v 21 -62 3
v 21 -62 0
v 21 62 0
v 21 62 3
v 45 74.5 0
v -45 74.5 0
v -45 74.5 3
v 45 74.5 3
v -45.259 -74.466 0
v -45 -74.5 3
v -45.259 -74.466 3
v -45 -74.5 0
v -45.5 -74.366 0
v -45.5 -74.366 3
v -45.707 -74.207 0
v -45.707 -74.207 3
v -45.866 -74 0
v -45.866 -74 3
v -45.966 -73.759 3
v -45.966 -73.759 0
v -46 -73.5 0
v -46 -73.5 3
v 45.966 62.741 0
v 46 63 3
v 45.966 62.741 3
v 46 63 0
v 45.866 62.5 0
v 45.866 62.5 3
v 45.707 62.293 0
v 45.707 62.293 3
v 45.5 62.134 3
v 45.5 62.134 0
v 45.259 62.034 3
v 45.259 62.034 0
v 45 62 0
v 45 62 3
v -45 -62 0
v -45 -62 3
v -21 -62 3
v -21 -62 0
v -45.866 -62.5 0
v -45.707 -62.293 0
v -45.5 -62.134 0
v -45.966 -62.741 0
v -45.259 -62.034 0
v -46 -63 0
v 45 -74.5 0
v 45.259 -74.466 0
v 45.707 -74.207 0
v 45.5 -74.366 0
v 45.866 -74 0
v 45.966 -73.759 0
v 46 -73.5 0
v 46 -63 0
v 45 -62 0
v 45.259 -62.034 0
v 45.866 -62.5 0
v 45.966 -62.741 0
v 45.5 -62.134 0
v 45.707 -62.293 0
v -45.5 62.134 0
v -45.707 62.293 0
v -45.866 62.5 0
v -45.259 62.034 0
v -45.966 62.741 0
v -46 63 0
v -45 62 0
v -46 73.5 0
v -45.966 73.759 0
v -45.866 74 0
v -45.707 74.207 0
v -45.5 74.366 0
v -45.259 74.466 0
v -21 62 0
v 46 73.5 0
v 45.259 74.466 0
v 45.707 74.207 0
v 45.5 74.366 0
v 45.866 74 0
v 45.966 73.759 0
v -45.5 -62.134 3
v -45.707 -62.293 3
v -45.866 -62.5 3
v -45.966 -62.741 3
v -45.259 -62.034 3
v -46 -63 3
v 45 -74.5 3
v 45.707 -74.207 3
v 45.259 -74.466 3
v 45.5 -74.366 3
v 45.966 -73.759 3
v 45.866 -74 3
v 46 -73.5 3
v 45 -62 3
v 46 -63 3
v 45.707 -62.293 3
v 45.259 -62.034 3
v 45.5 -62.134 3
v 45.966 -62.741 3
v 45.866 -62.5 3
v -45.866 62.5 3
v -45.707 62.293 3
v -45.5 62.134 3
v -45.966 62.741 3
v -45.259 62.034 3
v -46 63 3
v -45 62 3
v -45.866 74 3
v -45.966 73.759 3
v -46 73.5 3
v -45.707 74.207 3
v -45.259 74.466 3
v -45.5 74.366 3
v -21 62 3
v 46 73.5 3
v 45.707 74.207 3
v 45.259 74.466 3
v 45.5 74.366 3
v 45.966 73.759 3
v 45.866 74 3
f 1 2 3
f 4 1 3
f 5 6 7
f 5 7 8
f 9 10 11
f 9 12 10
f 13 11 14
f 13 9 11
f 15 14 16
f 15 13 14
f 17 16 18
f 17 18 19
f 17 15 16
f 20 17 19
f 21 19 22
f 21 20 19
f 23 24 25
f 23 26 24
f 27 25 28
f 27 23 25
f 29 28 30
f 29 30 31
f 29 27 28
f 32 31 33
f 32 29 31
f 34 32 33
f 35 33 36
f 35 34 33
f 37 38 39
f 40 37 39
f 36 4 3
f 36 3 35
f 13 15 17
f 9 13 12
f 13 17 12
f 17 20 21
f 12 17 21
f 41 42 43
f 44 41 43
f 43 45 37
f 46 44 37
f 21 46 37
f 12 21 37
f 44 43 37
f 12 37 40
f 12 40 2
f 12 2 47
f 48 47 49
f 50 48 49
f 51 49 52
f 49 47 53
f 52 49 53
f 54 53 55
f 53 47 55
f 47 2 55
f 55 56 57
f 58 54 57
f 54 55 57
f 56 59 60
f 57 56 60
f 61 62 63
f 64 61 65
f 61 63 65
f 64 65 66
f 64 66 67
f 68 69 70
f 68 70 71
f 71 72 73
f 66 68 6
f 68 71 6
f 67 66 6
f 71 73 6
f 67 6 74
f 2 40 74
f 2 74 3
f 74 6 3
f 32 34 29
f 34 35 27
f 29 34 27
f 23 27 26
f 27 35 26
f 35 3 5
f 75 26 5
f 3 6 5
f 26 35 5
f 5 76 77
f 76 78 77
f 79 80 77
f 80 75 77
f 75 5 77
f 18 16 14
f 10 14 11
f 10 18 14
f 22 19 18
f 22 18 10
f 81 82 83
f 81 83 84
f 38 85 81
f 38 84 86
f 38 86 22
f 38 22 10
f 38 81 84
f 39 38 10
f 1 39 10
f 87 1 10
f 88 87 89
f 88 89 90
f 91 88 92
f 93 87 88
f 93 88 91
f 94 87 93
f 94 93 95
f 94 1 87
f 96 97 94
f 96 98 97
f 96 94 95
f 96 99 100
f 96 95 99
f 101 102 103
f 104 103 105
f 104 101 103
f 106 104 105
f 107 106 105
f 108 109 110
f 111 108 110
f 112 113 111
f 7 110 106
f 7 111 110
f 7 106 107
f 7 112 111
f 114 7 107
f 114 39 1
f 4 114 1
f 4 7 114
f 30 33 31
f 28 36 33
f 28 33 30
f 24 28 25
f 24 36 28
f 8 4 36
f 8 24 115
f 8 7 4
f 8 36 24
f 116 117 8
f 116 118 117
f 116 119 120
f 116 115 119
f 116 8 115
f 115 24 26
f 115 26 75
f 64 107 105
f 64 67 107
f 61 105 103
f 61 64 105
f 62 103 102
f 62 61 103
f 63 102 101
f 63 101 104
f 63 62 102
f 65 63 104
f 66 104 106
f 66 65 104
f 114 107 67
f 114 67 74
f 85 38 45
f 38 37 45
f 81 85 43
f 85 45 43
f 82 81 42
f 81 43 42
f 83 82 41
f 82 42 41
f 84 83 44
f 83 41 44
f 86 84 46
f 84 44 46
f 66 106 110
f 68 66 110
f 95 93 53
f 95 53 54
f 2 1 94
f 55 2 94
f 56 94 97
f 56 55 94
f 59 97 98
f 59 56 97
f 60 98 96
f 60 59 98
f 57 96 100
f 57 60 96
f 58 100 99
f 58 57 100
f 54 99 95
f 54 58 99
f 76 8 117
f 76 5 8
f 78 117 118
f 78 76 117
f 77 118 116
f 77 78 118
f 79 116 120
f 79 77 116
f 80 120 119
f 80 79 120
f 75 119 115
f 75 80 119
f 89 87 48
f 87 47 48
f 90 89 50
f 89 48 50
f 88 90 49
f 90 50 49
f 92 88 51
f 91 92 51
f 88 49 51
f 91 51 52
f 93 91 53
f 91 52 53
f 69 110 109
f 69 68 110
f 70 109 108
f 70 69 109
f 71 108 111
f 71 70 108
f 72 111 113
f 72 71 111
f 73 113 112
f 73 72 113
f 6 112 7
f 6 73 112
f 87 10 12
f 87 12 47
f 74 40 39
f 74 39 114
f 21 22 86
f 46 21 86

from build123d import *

# Parameters (mm, degrees)
SKETCH_1_W      = 42
SKETCH_1_H      = 149
EXTRUDE_1_DEPTH = 3
SKETCH_2_W      = 25
SKETCH_2_H      = 12.5
EXTRUDE_2_DEPTH = 3
FILLET_1_R      = 1


with BuildPart() as part:
    # 草图1 → 凸台-拉伸1 (new body)
    with BuildSketch(Plane.XY):
        Rectangle(SKETCH_1_W, SKETCH_1_H)
    extrude(amount=EXTRUDE_1_DEPTH)

    # 草图2 → 凸台-拉伸2 (add)
    with BuildSketch(Plane.XY.offset(3)):
        with Locations((33.5, -68.25)):
            Rectangle(SKETCH_2_W, SKETCH_2_H)
        with Locations((-33.5, -68.25)):
            Rectangle(SKETCH_2_W, SKETCH_2_H)
        with Locations((-33.5, 68.25)):
            Rectangle(SKETCH_2_W, SKETCH_2_H)
        with Locations((33.5, 68.25)):
            Rectangle(SKETCH_2_W, SKETCH_2_H)
    extrude(amount=-EXTRUDE_2_DEPTH)

    # 圆角1
    fillet_1_edges = [part.edges().sort_by_distance(p)[0] for p in [
        (46, -74.5, 1.5),
        (46, -62, 1.5),
        (-46, -62, 1.5),
        (-46, -74.5, 1.5),
        (-46, 74.5, 1.5),
        (-46, 62, 1.5),
        (46, 62, 1.5),
        (46, 74.5, 1.5),
    ]]
    fillet(fillet_1_edges, radius=FILLET_1_R)


solid = part.part
